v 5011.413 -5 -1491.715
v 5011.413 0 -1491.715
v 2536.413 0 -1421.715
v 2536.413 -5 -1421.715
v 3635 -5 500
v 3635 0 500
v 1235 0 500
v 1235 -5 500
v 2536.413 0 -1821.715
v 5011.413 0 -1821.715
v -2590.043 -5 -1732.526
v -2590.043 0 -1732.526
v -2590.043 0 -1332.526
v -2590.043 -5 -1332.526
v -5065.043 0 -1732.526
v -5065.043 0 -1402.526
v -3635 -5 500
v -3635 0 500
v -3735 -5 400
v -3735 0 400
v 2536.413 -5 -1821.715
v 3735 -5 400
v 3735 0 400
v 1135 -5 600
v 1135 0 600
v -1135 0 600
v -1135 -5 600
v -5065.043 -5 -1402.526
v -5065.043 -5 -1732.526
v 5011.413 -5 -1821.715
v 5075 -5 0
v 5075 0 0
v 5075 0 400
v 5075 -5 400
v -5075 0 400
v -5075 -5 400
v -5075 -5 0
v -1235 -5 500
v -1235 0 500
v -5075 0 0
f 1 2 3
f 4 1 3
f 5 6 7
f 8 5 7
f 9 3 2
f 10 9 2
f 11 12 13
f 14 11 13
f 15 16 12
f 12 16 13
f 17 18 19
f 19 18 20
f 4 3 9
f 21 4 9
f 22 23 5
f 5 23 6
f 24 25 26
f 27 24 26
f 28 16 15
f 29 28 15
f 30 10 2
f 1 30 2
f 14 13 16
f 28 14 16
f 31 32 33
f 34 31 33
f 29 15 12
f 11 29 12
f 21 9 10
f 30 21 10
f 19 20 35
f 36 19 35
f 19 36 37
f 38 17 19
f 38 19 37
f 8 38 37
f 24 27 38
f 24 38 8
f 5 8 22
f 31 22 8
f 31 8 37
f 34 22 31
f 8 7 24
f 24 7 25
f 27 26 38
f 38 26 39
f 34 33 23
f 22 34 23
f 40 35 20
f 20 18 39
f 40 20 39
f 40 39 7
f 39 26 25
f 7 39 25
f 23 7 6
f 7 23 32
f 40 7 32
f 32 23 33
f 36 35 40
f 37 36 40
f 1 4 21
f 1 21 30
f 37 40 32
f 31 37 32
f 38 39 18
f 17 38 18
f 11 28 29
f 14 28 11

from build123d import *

# Parameters (mm, degrees)
F1_DEPTH = 5


with BuildPart() as f1:
    # F0 (on Front) → F1 (new body)
    with BuildSketch(Plane.XZ):
        Polygon((-5075, 0), (0, 0), (5075, 0), (5075, 400), (3735, 400), (3635, 500), (1235, 500), (1135, 600), (0, 600), (-1135, 600), (-1235, 500), (-3635, 500), (-3735, 400), (-5075, 400), align=None)
        Polygon((-2590.043449, -1332.525544), (-5065.043449, -1402.525544), (-5065.043449, -1732.525544), (-2590.043449, -1732.525544), align=None)
        Polygon((2536.413252, -1421.714878), (2536.413252, -1821.714878), (5011.413252, -1821.714878), (5011.413252, -1491.714878), align=None)
    extrude(amount=F1_DEPTH)


solid = f1.part
